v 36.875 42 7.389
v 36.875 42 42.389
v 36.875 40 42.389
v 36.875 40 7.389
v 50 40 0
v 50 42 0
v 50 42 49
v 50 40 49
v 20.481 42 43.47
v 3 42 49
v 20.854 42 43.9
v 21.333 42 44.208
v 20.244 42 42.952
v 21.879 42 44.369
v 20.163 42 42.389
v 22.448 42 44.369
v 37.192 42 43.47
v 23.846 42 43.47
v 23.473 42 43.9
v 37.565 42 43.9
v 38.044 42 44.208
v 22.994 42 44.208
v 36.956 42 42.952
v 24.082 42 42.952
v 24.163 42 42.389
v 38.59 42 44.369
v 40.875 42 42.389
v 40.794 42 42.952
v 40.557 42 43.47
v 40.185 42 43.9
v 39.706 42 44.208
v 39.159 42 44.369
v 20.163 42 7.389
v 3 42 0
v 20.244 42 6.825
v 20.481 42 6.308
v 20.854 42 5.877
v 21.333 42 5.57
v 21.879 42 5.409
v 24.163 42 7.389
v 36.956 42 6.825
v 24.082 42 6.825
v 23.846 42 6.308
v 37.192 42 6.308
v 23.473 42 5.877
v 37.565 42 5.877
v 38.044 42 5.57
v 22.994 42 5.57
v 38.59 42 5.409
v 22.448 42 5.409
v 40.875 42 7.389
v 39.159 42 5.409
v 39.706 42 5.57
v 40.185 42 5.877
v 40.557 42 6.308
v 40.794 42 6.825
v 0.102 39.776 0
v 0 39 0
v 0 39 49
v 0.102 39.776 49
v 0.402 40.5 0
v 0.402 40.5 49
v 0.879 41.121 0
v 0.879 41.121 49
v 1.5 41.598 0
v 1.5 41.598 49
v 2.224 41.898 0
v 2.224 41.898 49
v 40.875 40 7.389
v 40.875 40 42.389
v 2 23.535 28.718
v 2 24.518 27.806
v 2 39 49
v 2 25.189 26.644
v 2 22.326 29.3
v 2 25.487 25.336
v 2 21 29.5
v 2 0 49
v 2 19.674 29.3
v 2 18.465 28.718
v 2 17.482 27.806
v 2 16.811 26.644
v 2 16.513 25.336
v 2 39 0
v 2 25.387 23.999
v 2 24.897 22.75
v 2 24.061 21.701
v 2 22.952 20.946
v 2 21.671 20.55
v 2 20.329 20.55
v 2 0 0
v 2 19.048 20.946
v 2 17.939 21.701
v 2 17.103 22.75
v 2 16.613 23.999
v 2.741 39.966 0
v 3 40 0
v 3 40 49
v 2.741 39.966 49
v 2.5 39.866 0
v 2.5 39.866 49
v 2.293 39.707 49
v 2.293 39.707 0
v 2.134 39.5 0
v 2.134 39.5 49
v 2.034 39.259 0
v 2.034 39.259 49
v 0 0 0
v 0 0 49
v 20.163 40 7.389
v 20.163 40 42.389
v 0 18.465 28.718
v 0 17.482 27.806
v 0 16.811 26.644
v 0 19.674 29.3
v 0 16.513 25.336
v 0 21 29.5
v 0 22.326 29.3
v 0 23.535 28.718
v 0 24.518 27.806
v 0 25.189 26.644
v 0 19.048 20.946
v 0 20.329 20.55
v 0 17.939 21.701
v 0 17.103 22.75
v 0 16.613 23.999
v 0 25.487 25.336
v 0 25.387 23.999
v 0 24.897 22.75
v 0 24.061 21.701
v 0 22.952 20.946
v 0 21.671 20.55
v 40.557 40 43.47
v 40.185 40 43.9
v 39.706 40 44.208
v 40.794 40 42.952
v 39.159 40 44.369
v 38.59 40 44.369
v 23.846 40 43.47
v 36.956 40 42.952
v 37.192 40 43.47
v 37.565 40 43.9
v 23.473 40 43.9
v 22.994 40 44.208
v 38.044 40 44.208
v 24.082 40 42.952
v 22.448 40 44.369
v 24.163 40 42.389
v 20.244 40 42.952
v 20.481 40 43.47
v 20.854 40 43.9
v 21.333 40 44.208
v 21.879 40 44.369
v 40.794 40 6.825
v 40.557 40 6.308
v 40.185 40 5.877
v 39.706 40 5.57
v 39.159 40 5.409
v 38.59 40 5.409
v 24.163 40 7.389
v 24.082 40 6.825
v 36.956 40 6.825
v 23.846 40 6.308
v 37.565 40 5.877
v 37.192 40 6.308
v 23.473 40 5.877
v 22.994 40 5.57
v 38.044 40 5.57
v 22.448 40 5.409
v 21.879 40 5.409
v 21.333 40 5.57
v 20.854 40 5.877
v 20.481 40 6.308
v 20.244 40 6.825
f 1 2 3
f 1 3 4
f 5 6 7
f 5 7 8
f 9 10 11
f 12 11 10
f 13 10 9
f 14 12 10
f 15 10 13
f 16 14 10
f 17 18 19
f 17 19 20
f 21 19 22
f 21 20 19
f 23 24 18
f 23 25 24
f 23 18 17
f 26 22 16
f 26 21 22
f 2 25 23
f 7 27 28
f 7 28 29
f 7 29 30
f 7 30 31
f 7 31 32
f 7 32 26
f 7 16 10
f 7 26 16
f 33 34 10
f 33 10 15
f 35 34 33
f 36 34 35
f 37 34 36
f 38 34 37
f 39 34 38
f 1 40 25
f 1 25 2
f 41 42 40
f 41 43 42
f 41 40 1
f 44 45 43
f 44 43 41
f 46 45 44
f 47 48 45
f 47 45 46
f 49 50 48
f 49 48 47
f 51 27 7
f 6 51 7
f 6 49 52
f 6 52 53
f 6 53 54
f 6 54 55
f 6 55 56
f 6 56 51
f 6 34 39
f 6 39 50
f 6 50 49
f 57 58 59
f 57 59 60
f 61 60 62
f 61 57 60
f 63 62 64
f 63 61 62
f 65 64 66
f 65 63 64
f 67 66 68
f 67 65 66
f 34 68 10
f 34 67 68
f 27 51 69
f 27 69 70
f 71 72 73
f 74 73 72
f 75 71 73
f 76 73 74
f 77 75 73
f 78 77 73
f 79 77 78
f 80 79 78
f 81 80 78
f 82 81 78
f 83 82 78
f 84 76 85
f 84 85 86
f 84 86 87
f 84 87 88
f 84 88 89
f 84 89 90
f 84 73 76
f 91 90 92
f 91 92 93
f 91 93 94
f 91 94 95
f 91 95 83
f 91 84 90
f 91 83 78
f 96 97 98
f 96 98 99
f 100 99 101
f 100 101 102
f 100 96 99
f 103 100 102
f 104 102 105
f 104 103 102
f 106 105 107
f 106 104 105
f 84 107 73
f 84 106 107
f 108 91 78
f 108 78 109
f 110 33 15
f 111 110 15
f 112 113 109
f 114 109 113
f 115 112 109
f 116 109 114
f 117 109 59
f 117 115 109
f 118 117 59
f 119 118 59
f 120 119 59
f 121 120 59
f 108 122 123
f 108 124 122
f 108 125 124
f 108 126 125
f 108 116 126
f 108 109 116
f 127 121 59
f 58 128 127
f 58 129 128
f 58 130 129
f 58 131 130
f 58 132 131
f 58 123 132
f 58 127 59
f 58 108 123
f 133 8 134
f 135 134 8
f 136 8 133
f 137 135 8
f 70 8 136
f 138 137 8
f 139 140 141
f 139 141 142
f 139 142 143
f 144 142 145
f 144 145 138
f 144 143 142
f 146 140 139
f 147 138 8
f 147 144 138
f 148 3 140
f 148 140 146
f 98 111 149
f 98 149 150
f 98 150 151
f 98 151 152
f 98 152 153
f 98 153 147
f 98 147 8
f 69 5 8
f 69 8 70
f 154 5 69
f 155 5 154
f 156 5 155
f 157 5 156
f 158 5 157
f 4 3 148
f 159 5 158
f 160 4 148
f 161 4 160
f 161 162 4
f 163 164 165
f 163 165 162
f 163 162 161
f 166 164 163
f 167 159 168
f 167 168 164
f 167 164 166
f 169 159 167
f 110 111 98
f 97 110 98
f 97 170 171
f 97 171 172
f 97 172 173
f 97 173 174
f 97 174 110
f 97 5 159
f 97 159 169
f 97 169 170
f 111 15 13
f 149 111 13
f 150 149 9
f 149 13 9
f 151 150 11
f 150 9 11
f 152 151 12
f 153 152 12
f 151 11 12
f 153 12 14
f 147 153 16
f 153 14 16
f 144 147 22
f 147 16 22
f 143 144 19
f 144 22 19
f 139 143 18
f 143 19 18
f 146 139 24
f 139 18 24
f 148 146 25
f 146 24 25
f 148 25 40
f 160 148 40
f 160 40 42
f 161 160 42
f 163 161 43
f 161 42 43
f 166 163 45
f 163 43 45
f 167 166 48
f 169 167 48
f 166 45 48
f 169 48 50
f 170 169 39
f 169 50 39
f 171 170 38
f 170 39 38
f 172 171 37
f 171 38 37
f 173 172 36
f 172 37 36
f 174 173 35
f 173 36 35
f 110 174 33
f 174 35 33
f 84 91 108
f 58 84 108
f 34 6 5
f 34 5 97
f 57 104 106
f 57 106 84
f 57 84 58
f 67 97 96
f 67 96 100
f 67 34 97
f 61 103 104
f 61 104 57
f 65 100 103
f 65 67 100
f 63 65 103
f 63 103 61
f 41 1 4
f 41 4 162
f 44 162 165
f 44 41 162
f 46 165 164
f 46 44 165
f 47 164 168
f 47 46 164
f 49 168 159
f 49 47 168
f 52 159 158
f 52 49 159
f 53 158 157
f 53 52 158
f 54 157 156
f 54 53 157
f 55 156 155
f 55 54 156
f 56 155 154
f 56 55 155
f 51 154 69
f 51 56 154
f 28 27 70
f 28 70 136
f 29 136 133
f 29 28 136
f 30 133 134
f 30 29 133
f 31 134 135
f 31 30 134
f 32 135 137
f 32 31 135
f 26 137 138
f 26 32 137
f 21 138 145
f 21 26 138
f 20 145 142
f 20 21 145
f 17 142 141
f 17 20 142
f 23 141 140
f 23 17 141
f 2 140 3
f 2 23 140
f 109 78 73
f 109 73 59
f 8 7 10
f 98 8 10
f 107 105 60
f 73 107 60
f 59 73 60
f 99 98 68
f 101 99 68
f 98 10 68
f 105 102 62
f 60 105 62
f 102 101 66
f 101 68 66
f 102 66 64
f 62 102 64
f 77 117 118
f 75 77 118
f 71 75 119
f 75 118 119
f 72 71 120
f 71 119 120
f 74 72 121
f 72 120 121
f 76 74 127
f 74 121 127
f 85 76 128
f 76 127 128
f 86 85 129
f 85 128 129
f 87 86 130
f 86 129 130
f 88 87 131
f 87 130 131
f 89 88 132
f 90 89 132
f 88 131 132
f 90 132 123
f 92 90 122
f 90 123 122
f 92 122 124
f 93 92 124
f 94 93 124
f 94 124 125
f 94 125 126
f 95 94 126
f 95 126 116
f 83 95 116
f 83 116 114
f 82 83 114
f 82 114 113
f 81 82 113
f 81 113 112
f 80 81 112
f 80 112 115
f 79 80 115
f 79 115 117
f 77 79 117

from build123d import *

# Parameters (mm, degrees)
BASE_FLANGE1_DEPTH = 49
SKETCH7_R          = 4.5
CUT_EXTRUDE1_DEPTH = 82.639451248
CUT_EXTRUDE2_DEPTH = 82.639451248


# Sheet-metal steps are written as plain solids
with BuildPart() as part:
    # Sketch1 → Base-Flange1 (new body)
    with BuildSketch(Plane.XY):
        with BuildLine():
            Line((0, 0), (0, 39))
            ThreePointArc((0, 39), (0.878679656, 41.121320344), (3, 42))
            Line((3, 42), (50, 42))
            Line((50, 42), (50, 40))
            Line((50, 40), (3, 40))
            ThreePointArc((3, 40), (2.292893219, 39.707106781), (2, 39))
            Line((2, 39), (2, 0))
            Line((2, 0), (0, 0))
        make_face()
    extrude(amount=BASE_FLANGE1_DEPTH)

    # Sketch7 → Cut-Extrude1 (cut, through all)
    with BuildSketch(Plane.ZY):
        with Locations((25, 21)):
            Circle(SKETCH7_R)
    extrude(amount=-CUT_EXTRUDE1_DEPTH, mode=Mode.SUBTRACT)

    # Sketch6 → Cut-Extrude2 (cut, through all)
    with BuildSketch(Plane(origin=(0, 42, 0), x_dir=(1, 0, 0), z_dir=(0, 1, 0))):
        with BuildLine():
            Line((40.874848709, -7.388922921), (40.874848709, -42.388922921))
            ThreePointArc((40.874848709, -42.388922921), (38.874848709, -44.388922921), (36.874848709, -42.388922921))
            Line((36.874848709, -42.388922921), (36.874848709, -7.388922921))
            ThreePointArc((36.874848709, -7.388922921), (38.874848709, -5.388922921), (40.874848709, -7.388922921))
        make_face()
        with BuildLine():
            Line((20.163393388, -7.388922921), (20.163393388, -42.388922921))
            ThreePointArc((20.163393388, -42.388922921), (22.163393388, -44.388922921), (24.163393388, -42.388922921))
            Line((24.163393388, -42.388922921), (24.163393388, -7.388922921))
            ThreePointArc((24.163393388, -7.388922921), (22.163393388, -5.388922921), (20.163393388, -7.388922921))
        make_face()
    extrude(amount=-CUT_EXTRUDE2_DEPTH, mode=Mode.SUBTRACT)


solid = part.part
